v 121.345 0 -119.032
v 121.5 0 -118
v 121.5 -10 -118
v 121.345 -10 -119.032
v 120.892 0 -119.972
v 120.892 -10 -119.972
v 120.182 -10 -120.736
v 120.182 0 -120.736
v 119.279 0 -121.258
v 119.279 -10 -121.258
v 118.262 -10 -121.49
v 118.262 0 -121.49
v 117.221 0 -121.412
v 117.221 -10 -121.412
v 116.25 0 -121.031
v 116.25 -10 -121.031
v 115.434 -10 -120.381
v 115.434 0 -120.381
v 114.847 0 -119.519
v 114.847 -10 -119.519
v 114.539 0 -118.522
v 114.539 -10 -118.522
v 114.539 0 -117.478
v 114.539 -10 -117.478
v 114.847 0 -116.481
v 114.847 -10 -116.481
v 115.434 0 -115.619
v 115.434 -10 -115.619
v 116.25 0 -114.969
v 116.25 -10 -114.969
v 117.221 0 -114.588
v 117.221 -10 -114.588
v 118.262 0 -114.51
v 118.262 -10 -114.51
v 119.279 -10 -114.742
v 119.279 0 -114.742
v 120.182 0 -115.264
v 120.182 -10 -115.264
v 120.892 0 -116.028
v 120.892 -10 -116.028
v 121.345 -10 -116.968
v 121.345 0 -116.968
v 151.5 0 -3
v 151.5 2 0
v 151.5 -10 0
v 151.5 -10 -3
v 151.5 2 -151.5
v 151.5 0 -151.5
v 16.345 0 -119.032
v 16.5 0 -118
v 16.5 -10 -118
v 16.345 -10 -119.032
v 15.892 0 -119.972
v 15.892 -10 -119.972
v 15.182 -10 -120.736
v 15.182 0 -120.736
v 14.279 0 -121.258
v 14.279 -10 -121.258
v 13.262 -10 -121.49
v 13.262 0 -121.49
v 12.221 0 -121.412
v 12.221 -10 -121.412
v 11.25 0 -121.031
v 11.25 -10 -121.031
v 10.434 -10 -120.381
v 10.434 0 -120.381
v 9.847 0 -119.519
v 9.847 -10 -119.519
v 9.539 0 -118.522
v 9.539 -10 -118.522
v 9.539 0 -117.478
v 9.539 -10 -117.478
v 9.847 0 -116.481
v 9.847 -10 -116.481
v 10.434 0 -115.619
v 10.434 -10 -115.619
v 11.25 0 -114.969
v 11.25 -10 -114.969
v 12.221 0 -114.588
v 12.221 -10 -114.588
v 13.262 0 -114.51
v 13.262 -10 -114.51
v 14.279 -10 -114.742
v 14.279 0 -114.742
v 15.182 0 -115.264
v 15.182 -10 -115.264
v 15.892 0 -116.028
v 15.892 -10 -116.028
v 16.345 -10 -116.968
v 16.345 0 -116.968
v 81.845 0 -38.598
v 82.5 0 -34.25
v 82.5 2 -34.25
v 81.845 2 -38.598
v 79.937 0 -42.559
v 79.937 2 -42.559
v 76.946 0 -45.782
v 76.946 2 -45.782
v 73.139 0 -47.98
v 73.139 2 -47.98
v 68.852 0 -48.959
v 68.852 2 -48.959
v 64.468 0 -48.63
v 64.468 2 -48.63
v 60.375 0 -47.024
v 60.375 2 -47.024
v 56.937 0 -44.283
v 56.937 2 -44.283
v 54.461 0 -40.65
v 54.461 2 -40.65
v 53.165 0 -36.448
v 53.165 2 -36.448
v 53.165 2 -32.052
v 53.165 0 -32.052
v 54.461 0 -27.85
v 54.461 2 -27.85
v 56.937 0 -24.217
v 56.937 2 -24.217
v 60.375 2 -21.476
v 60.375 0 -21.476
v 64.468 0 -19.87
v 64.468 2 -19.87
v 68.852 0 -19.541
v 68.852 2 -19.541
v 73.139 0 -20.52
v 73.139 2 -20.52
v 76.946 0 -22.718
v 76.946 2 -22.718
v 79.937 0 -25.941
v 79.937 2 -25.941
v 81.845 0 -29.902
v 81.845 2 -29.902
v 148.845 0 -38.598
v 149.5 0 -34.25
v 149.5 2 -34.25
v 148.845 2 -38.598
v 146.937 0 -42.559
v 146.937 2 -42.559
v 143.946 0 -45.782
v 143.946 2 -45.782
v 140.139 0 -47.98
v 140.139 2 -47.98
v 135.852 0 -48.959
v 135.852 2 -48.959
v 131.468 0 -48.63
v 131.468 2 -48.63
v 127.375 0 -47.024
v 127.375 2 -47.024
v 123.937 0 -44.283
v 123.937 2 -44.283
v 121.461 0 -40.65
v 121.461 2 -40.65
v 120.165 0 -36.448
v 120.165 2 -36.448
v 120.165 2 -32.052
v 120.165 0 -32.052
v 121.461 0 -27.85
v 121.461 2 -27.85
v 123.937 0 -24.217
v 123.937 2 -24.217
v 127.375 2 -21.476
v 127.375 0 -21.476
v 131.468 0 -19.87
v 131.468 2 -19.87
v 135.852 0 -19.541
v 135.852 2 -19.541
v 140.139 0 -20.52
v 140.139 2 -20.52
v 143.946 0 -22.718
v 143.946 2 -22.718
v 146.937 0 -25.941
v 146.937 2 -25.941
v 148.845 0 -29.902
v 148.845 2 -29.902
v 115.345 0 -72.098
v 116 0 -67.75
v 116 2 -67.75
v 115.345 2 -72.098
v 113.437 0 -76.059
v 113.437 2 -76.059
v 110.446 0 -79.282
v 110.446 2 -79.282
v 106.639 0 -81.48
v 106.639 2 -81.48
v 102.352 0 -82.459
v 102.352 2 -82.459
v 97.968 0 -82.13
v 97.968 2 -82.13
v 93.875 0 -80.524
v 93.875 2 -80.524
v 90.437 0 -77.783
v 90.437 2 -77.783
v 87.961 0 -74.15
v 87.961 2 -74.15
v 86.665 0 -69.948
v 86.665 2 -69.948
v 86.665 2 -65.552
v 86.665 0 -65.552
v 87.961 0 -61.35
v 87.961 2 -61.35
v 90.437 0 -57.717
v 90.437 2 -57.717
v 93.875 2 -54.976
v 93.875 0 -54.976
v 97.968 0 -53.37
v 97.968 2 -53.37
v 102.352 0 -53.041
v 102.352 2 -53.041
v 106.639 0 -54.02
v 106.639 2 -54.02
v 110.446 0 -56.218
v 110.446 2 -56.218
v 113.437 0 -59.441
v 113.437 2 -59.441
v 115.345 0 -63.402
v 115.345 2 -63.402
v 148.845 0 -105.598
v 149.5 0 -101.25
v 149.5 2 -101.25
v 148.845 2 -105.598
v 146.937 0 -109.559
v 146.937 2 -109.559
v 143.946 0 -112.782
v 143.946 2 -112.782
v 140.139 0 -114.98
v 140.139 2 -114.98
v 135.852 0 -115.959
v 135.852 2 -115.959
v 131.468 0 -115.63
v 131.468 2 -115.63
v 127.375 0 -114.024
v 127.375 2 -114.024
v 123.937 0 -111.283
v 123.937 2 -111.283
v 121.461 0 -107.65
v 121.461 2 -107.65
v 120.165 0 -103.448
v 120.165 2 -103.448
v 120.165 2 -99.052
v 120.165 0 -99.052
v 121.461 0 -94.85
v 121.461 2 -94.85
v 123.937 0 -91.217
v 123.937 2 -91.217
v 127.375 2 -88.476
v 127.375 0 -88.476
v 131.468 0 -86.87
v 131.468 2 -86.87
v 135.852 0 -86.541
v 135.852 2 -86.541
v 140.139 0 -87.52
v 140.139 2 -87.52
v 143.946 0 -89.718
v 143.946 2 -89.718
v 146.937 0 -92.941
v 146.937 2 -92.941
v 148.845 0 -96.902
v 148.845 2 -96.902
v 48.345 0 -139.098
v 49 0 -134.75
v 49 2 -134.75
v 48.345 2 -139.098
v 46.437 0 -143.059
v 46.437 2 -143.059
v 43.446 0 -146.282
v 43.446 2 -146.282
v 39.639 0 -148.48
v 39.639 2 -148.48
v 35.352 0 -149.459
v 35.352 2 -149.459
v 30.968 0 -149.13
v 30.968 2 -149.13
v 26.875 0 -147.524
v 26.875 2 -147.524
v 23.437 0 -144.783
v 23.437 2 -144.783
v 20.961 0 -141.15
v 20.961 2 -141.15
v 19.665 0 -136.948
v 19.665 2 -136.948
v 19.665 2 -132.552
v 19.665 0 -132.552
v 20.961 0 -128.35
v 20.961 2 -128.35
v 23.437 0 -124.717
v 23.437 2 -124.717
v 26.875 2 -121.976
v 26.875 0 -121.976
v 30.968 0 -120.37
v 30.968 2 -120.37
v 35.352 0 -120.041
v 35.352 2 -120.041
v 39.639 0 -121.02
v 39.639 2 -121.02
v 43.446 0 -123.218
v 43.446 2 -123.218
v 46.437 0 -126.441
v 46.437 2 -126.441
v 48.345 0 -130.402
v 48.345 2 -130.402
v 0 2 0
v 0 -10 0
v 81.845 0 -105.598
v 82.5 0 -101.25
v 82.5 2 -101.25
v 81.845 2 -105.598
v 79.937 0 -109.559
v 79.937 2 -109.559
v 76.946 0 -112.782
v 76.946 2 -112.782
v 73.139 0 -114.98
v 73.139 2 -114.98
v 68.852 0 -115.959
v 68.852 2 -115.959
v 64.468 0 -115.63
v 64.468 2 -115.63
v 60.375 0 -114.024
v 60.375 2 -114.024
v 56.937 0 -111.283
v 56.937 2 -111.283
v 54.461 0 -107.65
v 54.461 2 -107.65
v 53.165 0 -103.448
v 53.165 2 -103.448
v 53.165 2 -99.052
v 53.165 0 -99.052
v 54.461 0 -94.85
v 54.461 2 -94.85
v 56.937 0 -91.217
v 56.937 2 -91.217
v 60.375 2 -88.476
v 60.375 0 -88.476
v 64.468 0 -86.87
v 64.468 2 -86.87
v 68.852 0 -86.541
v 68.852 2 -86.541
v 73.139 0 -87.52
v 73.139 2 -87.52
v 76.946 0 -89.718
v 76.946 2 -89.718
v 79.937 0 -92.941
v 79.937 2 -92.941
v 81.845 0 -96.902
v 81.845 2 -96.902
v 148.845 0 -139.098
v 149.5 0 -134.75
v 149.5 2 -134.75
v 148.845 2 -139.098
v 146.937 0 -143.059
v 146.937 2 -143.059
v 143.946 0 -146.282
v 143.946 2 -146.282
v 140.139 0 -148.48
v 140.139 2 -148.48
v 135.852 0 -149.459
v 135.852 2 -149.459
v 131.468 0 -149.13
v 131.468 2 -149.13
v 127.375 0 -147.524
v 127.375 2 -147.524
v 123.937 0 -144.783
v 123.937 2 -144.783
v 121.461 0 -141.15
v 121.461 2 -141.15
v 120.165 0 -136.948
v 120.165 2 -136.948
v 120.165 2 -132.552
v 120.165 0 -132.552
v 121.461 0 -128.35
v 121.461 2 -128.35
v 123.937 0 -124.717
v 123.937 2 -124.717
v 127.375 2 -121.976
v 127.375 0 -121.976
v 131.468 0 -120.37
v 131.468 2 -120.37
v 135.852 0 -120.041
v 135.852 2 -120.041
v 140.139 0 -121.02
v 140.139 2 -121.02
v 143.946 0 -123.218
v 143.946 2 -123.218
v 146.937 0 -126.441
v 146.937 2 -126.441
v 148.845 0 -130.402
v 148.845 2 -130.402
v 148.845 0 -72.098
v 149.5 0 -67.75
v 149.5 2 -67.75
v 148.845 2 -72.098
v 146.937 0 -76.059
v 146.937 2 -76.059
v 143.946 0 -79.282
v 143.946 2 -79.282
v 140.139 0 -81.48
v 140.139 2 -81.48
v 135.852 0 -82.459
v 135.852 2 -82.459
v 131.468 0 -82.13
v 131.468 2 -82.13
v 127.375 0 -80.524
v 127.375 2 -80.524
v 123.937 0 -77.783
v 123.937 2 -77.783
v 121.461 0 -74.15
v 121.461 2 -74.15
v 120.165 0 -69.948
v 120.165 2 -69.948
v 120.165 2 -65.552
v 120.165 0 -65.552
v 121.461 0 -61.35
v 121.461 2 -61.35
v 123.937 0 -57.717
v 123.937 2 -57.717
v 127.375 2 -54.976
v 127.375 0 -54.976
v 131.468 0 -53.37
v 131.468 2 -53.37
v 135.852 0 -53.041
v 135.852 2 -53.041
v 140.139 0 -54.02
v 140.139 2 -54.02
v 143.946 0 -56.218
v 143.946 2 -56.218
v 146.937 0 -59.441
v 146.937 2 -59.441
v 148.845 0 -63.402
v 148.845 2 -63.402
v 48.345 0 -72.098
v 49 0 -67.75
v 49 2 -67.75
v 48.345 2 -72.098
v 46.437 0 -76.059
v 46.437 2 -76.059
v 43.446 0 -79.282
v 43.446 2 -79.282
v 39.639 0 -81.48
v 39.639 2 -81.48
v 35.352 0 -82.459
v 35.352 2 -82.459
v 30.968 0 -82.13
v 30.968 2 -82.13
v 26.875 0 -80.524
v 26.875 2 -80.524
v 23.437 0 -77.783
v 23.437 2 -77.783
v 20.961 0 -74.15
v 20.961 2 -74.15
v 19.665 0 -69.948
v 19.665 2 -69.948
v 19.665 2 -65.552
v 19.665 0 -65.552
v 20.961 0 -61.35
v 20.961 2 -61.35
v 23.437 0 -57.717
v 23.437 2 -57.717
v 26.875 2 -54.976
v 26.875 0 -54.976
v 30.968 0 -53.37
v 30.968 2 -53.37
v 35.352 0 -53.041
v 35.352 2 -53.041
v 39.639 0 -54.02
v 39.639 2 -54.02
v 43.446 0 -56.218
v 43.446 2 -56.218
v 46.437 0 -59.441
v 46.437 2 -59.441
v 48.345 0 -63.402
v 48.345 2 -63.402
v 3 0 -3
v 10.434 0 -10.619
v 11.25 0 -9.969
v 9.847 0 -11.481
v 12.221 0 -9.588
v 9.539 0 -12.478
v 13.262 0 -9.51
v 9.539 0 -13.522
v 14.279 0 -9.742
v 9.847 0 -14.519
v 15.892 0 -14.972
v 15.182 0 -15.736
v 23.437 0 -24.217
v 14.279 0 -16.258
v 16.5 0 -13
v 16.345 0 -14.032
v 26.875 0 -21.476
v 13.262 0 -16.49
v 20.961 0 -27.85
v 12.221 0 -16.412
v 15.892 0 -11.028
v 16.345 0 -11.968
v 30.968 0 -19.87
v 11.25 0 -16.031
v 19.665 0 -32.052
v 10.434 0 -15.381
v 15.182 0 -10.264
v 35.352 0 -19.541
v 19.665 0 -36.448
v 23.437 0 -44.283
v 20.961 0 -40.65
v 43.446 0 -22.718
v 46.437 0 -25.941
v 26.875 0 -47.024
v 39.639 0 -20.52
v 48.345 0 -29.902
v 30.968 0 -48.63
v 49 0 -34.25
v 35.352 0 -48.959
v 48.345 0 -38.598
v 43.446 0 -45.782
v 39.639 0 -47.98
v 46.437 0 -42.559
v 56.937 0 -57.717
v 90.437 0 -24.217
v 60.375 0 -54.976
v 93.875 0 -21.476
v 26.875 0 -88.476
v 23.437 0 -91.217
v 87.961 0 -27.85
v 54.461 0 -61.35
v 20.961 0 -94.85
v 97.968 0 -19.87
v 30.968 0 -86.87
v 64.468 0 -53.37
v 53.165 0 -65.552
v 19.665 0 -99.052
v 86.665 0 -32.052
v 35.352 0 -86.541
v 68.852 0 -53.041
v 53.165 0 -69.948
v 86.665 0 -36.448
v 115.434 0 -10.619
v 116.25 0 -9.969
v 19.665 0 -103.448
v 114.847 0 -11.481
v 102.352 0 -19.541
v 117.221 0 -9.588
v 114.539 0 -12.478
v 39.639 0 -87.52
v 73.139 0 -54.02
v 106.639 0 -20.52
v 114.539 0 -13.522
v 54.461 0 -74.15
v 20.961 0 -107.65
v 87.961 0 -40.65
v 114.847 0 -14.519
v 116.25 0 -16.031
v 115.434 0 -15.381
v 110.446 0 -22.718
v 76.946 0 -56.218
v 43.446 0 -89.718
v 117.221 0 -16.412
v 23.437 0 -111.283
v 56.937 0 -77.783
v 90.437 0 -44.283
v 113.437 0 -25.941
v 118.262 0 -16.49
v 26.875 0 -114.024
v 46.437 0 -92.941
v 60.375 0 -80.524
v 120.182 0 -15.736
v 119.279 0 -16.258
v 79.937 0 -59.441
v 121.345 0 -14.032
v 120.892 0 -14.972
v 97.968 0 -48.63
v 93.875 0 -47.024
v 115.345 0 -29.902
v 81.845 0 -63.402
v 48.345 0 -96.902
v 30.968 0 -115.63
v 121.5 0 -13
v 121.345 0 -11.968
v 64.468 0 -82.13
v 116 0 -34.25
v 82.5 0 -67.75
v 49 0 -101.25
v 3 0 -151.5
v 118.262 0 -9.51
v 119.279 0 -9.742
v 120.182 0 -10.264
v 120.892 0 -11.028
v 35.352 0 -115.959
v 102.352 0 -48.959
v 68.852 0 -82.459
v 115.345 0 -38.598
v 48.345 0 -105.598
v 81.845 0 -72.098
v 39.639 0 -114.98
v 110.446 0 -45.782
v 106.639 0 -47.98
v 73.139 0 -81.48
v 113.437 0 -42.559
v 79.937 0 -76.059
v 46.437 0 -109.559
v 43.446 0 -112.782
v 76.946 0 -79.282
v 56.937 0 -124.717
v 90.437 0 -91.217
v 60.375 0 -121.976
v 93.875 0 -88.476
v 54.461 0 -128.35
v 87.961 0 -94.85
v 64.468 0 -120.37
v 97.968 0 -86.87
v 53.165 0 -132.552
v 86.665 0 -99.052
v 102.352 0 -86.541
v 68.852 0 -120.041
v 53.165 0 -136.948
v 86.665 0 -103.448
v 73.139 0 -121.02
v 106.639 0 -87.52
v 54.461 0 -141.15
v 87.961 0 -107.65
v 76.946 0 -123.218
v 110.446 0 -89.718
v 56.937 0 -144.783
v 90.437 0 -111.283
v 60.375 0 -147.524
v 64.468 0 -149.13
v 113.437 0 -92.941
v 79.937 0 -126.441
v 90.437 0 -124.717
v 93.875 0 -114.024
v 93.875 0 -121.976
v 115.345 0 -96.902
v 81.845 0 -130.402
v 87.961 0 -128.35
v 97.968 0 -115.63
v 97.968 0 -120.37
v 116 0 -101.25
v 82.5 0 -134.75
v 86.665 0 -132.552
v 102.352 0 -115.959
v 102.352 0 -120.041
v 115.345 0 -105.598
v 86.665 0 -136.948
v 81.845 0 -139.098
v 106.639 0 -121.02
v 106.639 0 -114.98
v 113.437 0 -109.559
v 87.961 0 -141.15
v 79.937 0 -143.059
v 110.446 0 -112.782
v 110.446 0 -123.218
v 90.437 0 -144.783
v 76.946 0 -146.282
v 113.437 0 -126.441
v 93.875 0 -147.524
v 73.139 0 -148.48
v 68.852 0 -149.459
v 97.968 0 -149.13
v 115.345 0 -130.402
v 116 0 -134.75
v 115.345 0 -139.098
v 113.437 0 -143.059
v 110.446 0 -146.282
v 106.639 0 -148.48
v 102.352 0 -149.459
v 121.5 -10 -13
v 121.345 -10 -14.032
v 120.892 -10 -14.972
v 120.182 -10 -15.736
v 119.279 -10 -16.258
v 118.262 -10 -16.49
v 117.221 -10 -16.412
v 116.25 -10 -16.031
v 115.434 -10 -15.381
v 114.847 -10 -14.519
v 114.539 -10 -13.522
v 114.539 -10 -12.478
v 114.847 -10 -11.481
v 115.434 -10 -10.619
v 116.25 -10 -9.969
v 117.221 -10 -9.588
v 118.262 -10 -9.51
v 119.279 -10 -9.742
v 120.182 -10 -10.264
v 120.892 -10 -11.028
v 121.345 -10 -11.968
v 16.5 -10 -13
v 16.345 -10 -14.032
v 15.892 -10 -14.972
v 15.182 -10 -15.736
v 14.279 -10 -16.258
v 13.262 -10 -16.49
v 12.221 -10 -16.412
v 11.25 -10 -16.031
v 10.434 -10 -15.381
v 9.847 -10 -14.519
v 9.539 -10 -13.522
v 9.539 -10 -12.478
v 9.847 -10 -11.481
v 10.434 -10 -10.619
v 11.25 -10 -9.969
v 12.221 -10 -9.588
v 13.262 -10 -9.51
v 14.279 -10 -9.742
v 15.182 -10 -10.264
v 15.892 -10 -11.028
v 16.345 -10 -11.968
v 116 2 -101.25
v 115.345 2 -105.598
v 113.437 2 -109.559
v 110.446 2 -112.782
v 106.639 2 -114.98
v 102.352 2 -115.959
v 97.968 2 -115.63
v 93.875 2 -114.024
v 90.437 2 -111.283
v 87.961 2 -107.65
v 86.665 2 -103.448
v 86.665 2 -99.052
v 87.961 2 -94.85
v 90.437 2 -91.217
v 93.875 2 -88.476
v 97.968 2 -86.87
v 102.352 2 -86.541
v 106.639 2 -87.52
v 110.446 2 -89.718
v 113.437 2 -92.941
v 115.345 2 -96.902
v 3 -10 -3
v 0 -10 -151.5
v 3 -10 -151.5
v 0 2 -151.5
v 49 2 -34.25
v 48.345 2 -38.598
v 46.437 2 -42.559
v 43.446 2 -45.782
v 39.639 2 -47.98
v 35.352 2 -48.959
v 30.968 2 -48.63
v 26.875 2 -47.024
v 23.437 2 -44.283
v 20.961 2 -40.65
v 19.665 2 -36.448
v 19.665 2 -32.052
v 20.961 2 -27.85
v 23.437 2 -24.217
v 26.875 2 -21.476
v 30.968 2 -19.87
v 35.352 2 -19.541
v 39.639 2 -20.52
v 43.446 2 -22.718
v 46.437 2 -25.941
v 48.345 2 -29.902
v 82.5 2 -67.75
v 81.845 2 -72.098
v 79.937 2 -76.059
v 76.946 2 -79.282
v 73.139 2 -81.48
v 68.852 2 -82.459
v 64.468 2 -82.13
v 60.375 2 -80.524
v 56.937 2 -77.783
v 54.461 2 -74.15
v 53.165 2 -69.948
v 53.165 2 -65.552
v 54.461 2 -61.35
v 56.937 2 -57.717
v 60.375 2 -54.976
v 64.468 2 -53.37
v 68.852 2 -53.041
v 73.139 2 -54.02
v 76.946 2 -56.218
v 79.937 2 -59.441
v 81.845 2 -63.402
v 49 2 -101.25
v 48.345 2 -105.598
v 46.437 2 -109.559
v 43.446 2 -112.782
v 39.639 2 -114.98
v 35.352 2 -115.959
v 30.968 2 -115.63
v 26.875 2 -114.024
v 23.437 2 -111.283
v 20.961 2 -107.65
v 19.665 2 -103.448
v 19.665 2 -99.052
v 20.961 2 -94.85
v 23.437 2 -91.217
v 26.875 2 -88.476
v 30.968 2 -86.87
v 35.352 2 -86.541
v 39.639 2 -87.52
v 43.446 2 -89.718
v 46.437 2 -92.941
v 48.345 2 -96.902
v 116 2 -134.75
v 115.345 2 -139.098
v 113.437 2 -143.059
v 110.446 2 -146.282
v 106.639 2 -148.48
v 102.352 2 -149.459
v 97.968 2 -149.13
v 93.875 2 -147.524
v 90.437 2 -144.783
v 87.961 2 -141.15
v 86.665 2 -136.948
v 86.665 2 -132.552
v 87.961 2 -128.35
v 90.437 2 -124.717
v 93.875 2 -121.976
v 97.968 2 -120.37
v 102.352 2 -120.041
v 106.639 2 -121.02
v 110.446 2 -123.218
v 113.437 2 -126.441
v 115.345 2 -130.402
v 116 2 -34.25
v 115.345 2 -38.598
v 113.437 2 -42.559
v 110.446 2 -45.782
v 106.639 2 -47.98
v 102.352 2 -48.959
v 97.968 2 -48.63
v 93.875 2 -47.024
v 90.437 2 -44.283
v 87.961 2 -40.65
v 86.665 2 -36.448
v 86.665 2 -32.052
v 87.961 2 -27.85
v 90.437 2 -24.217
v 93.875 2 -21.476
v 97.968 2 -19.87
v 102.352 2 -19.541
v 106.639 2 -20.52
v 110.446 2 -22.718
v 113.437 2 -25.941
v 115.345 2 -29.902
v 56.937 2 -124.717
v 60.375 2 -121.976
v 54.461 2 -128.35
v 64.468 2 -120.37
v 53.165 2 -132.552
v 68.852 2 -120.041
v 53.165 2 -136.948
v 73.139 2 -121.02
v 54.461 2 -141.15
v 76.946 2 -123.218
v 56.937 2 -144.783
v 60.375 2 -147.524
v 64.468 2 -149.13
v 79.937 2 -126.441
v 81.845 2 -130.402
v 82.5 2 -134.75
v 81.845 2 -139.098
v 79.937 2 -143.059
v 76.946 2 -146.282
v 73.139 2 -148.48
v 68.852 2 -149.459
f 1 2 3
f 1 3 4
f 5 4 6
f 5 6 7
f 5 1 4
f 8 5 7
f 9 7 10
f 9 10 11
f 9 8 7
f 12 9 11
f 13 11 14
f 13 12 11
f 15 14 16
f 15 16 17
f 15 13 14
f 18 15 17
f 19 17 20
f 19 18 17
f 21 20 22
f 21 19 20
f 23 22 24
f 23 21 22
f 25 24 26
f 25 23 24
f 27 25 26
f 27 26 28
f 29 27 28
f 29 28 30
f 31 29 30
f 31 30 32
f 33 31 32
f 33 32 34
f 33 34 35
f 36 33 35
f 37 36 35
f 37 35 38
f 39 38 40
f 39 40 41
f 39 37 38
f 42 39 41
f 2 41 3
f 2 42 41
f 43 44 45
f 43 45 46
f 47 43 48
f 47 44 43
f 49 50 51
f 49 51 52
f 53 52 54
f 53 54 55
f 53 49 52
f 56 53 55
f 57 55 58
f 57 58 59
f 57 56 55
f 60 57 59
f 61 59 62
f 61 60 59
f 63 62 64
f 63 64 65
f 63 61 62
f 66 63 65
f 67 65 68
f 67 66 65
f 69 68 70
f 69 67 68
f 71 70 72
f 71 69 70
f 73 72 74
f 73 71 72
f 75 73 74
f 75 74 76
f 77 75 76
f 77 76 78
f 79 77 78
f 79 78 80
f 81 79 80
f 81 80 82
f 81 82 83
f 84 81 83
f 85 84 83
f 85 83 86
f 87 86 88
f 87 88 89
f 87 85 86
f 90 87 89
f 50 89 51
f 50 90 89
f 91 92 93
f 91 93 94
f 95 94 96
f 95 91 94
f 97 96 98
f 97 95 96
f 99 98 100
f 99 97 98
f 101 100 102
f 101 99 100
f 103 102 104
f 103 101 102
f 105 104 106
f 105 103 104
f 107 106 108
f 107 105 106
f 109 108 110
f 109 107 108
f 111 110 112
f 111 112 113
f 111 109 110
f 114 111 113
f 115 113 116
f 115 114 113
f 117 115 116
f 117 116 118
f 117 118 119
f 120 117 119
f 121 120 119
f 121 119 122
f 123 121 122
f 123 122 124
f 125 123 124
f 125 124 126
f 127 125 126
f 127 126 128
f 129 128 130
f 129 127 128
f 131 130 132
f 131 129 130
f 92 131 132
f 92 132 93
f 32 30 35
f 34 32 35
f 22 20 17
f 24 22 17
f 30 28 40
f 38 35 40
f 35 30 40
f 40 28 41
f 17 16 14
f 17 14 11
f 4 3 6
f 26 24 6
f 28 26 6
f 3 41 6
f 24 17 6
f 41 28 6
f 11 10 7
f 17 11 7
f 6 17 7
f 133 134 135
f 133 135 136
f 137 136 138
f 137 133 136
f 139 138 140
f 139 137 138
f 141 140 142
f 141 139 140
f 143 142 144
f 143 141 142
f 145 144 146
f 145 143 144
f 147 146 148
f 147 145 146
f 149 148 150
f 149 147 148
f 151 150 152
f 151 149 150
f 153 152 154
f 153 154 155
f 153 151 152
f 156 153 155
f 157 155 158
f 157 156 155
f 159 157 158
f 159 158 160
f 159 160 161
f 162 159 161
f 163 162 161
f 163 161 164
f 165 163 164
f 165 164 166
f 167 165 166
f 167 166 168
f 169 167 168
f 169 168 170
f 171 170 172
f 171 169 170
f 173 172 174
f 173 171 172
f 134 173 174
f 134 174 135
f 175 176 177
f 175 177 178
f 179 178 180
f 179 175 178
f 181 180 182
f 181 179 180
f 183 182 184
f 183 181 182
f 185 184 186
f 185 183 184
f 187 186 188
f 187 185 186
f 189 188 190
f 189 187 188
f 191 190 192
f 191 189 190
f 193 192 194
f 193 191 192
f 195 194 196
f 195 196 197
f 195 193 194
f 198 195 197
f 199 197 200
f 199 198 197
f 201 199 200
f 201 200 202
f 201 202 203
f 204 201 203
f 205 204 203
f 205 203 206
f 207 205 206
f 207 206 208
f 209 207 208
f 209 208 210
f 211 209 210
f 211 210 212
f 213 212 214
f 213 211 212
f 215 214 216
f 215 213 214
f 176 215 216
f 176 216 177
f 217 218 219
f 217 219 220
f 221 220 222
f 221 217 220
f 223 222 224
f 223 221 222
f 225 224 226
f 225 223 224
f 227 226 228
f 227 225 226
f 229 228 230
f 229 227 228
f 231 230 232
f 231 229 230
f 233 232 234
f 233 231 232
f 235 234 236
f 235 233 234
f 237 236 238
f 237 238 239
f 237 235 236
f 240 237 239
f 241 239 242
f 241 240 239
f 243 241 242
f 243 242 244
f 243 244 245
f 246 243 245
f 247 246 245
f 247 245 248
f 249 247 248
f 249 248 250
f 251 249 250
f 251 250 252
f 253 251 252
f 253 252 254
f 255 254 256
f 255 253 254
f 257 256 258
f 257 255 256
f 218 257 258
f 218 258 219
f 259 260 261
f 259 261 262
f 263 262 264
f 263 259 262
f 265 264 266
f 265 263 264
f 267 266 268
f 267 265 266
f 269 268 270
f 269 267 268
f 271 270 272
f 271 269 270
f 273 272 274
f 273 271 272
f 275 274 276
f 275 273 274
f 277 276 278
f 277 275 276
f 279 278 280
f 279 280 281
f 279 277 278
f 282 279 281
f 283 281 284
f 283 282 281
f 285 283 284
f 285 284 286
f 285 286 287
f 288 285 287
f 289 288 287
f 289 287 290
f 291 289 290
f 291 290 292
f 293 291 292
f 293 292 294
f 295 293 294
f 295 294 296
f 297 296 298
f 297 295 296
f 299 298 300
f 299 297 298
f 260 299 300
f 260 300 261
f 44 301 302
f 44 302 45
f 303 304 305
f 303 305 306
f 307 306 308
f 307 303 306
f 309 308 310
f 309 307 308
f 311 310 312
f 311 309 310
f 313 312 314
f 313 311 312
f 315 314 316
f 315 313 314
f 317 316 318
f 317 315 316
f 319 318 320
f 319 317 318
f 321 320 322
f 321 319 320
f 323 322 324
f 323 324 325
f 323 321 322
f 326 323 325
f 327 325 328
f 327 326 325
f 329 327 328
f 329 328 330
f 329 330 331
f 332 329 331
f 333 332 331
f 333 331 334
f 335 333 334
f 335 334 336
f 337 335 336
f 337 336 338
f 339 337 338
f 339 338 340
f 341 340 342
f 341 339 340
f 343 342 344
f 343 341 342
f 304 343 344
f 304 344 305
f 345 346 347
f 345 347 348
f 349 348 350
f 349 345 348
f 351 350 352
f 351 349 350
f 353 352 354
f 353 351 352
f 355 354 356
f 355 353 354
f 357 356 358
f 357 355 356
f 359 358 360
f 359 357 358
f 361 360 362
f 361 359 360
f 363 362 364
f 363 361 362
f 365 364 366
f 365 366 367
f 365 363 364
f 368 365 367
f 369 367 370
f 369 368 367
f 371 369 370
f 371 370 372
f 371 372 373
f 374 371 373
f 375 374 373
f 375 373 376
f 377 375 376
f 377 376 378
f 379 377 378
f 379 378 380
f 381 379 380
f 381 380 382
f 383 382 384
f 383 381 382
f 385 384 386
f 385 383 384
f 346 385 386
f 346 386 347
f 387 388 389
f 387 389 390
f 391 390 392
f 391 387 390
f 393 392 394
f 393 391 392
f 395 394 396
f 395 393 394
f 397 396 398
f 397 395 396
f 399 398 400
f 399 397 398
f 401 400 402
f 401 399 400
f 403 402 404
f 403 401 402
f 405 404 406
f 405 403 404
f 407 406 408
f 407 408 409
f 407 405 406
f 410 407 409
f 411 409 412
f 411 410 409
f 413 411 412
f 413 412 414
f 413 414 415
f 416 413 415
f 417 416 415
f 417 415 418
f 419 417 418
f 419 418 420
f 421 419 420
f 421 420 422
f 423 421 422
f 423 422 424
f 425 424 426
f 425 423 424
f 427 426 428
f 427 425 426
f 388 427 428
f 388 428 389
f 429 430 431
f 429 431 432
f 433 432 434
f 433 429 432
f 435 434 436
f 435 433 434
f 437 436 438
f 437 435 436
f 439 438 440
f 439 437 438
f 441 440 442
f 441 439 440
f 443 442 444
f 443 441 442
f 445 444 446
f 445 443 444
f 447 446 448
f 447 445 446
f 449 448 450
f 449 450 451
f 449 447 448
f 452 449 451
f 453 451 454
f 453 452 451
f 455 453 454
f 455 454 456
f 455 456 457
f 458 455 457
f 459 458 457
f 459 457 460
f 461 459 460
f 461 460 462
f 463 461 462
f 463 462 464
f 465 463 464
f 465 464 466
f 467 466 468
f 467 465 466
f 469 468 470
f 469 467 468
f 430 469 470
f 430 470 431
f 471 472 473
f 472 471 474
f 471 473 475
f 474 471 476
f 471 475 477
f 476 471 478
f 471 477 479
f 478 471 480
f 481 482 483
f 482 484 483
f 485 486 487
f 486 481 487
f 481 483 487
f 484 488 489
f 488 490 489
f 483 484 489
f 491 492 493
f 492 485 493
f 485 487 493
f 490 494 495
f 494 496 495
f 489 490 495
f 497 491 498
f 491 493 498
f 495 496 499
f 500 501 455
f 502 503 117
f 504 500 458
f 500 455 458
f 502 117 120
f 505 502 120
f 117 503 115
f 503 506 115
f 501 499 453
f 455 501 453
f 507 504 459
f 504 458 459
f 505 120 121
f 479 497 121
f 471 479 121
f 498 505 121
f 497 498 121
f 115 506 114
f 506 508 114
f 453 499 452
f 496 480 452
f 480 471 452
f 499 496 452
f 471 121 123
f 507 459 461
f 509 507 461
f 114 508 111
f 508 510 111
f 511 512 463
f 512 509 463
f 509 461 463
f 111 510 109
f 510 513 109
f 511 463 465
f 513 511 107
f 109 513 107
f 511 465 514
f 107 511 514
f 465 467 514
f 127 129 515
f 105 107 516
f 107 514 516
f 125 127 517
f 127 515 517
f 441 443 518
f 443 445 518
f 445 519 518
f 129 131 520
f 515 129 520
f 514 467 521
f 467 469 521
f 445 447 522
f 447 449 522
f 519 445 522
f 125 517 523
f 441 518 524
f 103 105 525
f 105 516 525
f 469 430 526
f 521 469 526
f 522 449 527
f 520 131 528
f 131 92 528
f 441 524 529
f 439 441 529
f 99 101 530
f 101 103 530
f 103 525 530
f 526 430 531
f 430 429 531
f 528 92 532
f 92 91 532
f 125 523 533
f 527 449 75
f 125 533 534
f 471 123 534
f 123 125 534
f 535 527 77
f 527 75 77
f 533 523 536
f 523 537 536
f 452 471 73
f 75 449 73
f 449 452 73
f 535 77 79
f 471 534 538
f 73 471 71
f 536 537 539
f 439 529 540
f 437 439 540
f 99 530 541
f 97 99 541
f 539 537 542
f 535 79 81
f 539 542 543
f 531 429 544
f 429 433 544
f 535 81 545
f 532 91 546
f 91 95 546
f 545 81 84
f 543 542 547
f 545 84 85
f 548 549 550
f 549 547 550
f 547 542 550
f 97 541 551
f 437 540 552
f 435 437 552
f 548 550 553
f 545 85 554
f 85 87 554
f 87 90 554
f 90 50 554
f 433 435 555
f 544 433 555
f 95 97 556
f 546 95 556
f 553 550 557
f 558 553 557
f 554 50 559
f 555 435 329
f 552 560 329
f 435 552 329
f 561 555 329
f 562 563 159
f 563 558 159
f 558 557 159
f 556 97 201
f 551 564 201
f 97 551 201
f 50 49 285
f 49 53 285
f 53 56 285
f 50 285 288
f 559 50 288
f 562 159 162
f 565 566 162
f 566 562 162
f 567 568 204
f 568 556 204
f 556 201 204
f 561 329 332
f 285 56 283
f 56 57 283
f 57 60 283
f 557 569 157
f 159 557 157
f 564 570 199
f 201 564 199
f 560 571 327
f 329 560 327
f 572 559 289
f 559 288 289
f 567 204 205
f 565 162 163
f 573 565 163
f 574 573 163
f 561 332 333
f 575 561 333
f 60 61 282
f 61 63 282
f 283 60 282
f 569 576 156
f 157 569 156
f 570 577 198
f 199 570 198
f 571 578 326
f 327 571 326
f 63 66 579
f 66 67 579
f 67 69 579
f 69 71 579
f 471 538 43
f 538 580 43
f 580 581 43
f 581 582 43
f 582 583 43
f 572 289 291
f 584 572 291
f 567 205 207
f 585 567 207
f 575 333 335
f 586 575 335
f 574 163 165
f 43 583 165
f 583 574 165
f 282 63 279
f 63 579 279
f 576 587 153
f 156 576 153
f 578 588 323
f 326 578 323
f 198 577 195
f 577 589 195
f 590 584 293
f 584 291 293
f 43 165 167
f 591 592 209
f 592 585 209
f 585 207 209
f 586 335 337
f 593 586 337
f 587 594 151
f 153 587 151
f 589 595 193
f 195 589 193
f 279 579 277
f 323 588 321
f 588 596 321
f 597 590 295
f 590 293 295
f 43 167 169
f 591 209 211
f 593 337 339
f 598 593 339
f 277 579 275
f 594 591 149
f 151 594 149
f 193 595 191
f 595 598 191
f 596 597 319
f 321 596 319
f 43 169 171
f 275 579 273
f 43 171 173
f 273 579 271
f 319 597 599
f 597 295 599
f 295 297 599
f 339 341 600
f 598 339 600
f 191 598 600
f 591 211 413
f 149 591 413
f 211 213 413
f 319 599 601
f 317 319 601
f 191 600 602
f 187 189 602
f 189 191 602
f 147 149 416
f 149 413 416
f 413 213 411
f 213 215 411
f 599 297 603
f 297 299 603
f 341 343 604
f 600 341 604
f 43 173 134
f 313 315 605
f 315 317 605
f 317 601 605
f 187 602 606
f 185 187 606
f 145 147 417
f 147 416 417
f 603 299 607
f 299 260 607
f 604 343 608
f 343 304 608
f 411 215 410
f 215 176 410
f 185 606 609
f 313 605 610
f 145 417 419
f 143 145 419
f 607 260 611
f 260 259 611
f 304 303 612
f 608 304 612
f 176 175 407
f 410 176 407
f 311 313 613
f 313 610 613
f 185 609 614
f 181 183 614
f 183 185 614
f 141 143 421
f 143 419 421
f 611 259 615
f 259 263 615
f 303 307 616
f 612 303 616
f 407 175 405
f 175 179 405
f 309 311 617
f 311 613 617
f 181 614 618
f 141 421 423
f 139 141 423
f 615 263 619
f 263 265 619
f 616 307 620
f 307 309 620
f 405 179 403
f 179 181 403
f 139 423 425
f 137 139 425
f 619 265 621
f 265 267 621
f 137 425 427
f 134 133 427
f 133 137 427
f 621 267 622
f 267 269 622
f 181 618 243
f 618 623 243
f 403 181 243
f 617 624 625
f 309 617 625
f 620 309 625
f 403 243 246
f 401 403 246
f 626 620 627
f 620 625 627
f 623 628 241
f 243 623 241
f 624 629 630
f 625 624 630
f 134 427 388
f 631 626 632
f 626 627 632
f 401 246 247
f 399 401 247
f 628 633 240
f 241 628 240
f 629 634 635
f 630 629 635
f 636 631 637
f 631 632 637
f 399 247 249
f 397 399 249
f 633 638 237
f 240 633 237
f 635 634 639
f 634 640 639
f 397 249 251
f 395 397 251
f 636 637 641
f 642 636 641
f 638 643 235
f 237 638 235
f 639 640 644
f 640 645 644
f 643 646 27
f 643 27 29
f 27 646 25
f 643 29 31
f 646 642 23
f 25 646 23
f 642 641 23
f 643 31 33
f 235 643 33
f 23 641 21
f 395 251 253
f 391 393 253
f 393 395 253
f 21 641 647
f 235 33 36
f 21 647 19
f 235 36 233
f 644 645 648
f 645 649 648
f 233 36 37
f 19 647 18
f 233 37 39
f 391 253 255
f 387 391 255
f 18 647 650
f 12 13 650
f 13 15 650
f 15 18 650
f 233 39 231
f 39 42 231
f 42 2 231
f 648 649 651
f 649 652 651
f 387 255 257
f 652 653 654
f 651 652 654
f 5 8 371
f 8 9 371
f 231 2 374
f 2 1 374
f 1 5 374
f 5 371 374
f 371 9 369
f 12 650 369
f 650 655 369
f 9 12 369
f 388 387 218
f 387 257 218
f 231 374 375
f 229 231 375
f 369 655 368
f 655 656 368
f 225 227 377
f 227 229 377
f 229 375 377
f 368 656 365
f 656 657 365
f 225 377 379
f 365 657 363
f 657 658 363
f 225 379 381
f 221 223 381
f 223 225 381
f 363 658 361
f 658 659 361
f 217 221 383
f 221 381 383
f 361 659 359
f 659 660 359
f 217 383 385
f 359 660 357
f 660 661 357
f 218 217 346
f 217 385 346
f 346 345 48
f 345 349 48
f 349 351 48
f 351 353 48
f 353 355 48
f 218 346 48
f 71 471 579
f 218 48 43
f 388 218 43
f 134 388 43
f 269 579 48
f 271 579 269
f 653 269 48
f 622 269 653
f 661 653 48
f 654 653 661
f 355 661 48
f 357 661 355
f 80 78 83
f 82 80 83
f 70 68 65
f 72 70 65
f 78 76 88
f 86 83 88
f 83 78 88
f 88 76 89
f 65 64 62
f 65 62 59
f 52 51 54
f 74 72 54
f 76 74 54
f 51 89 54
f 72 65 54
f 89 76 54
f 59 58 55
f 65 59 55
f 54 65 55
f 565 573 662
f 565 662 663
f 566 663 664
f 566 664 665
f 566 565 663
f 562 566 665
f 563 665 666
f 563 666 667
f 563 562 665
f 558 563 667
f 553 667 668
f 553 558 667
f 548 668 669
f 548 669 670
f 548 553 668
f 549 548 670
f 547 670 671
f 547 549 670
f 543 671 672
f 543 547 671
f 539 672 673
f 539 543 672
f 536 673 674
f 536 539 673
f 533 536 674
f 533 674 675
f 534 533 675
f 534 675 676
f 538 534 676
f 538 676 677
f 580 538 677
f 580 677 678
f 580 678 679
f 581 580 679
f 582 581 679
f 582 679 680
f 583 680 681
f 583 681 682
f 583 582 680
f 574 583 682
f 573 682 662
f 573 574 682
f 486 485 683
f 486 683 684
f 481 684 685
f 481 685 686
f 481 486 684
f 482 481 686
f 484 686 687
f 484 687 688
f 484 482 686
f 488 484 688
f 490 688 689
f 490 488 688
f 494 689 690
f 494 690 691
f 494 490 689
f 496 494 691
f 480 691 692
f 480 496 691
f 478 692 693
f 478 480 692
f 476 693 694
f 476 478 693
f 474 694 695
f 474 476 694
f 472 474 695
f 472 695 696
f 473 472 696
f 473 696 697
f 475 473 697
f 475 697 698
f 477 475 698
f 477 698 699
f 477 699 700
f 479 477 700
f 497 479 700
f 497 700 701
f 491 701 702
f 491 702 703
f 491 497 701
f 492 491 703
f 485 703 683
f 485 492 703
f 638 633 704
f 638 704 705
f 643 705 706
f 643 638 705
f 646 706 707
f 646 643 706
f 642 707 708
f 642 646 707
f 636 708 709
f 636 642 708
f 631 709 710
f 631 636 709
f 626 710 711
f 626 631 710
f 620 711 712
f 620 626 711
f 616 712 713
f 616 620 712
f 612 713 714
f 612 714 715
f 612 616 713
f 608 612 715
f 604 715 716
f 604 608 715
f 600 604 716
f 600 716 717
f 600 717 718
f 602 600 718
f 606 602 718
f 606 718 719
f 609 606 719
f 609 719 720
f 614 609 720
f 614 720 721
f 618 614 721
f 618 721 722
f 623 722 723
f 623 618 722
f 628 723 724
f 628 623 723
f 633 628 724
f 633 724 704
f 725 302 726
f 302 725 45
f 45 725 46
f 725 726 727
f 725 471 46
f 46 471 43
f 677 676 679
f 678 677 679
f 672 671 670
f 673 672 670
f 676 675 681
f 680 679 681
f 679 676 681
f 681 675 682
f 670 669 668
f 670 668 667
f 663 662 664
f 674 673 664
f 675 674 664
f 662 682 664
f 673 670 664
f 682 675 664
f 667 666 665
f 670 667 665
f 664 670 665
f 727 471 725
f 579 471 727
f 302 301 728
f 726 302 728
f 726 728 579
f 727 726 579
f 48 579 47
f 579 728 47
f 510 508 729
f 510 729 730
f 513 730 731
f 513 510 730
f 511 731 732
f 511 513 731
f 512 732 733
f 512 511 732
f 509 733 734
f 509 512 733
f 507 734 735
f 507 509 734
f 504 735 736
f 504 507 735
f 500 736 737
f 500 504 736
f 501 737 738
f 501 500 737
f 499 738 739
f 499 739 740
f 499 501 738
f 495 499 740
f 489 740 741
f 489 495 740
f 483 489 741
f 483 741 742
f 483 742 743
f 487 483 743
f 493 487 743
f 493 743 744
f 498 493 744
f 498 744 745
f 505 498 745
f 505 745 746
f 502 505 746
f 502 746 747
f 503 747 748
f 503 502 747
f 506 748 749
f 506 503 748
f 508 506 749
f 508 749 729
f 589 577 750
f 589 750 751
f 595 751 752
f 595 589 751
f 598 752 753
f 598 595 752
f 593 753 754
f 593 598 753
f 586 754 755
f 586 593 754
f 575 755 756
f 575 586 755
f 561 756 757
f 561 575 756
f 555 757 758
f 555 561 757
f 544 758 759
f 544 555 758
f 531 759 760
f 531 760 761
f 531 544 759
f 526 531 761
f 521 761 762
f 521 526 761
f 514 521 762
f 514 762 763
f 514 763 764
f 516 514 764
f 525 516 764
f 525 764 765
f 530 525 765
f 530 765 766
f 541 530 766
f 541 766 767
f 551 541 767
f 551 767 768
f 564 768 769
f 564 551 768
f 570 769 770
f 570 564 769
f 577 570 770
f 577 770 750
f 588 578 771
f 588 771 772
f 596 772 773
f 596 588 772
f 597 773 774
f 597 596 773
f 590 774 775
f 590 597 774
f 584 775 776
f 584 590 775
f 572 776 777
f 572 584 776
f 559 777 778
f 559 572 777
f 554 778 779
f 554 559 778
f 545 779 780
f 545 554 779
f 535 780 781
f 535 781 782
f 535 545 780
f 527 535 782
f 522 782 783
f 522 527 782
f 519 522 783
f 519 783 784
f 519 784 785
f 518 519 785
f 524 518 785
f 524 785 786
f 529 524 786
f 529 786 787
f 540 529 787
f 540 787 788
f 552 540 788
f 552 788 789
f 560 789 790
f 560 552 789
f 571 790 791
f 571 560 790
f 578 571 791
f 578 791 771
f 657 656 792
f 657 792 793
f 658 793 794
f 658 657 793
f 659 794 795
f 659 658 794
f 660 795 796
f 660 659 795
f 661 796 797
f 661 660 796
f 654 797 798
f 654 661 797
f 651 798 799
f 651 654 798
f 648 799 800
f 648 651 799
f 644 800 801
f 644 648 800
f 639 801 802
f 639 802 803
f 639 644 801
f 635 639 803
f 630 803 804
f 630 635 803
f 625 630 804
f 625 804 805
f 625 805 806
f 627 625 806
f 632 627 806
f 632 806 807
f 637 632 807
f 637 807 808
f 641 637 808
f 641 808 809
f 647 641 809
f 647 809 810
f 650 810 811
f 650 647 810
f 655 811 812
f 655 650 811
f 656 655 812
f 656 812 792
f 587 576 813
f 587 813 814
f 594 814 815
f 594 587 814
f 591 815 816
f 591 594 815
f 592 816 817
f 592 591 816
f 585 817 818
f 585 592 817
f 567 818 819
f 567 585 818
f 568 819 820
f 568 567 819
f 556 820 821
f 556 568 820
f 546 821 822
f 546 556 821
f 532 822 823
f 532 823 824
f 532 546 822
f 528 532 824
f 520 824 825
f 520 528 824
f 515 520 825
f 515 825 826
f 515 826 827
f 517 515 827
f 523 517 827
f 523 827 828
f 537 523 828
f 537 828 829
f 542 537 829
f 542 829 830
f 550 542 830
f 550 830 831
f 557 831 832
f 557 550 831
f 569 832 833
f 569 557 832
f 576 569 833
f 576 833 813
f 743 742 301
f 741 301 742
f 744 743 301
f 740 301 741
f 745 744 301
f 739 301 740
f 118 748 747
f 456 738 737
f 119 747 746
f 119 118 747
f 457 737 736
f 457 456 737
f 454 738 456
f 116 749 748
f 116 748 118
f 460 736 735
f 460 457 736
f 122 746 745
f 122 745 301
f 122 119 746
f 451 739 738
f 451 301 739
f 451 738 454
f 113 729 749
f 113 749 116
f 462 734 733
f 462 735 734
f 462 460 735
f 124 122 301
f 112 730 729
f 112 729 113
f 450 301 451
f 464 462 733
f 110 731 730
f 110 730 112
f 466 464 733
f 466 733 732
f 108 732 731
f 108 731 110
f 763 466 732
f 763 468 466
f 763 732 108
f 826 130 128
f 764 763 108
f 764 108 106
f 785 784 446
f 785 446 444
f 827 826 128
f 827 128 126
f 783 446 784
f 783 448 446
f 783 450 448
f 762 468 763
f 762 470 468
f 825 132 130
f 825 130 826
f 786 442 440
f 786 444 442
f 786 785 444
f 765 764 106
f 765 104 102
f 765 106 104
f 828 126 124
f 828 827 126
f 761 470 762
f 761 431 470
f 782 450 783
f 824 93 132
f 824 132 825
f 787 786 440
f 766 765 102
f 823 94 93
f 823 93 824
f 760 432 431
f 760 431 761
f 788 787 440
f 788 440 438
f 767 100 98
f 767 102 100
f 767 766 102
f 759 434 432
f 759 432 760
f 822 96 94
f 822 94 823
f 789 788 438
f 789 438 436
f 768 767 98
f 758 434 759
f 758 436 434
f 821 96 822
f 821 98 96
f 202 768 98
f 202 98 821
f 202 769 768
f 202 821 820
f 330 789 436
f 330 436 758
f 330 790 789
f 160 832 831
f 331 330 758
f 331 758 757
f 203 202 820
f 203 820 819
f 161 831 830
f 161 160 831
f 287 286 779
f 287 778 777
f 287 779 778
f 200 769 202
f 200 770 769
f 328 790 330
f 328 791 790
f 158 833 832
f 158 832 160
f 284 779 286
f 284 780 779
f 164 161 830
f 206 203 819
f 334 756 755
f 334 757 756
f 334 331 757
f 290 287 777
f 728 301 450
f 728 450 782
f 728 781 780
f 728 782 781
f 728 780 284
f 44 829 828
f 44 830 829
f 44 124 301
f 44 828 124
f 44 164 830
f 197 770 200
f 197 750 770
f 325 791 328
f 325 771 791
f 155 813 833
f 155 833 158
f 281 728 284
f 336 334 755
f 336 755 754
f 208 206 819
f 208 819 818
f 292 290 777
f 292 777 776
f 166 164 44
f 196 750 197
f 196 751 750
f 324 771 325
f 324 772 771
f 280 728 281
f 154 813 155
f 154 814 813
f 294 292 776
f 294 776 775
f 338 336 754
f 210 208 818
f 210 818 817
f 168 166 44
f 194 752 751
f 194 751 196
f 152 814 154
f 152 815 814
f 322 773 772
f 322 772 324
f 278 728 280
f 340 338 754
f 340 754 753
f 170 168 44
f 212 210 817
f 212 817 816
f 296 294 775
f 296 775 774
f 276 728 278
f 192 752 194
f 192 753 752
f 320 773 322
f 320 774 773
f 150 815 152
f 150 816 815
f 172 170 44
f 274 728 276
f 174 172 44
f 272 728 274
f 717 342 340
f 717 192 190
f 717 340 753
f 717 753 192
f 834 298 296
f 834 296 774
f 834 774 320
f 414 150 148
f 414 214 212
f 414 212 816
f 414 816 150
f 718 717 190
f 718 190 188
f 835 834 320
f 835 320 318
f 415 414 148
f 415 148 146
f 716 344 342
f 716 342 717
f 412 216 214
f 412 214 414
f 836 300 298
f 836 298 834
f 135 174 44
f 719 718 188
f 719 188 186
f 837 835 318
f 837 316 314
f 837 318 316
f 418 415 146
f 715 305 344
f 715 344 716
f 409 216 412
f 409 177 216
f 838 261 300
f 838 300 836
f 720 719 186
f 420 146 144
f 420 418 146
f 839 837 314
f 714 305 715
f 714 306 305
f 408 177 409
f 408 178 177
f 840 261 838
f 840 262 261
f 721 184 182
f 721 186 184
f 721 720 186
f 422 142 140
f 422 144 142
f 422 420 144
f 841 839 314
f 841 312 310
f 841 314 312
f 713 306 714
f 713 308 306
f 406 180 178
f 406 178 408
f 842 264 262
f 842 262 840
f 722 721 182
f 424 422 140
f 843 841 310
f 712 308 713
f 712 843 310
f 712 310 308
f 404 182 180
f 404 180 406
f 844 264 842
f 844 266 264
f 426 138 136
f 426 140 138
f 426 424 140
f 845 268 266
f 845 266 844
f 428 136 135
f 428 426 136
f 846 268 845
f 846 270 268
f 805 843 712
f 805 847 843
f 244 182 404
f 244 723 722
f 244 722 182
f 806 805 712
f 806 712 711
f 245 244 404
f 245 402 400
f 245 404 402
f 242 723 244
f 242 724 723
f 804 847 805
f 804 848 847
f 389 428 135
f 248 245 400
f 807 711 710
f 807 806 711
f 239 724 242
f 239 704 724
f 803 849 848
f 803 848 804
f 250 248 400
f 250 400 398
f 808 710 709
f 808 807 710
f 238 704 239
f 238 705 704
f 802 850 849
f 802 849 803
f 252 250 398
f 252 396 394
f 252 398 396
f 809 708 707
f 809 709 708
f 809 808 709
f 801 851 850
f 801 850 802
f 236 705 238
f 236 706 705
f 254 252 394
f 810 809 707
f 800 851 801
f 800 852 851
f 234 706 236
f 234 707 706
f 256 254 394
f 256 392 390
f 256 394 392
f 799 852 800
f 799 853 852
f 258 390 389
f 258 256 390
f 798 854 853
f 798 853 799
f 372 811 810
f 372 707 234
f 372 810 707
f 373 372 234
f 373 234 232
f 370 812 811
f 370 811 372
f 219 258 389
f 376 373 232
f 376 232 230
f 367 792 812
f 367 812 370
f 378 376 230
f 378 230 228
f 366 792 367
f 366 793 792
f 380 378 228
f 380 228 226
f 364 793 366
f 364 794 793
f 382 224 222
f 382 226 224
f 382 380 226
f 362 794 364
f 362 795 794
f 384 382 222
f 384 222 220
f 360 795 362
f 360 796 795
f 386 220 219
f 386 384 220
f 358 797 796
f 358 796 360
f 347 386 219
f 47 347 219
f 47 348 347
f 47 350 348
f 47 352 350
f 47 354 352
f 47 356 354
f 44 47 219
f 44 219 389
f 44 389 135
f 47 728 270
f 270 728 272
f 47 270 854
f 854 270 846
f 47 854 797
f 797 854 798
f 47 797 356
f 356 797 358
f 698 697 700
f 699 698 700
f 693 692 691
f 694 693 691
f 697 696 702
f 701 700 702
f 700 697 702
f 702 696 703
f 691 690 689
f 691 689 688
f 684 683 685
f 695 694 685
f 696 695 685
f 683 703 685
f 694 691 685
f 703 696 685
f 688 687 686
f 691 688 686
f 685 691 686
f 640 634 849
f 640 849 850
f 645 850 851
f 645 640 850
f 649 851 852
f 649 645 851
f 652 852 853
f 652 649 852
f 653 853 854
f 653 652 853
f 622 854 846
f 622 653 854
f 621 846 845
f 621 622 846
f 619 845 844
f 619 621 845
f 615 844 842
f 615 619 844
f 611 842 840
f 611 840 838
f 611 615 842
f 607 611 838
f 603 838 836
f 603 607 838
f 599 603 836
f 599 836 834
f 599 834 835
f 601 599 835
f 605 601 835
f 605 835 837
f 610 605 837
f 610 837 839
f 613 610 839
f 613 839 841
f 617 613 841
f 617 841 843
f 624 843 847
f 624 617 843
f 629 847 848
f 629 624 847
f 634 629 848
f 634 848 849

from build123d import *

# Parameters (mm, degrees)
SKETCH1_W            = 151.5
SKETCH1_H            = 151.5
BOSS_EXTRUDE1_DEPTH  = 2
SKETCH2_R            = 14.75
CUT_EXTRUDE2_DEPTH   = 2
LPATTERN1_COUNT      = 4
LPATTERN1_PITCH      = 33.5
LPATTERN1_COUNT_DIR2 = 4
LPATTERN1_PITCH_DIR2 = 33.5
SKETCH3_W            = 151.5
SKETCH3_H            = 151.5
BOSS_EXTRUDE2_DEPTH  = 10
SKETCH5_W            = 148.5
SKETCH5_H            = 148.5
CUT_EXTRUDE4_DEPTH   = 10
SKETCH8_R            = 3.5
BOSS_EXTRUDE4_DEPTH  = 10
LPATTERN2_COUNT      = 2
LPATTERN2_PITCH      = 105
LPATTERN2_COUNT_DIR2 = 2
LPATTERN2_PITCH_DIR2 = 105


with BuildPart() as part:
    # Sketch1 → Boss-Extrude1 (new body)
    with BuildSketch(Plane(origin=(0, 0, 0), x_dir=(1, 0, 0), z_dir=(0, 1, 0))):
        with Locations((75.75, 75.75)):
            Rectangle(SKETCH1_W, SKETCH1_H)
    extrude(amount=BOSS_EXTRUDE1_DEPTH)

    # Sketch2 → Cut-Extrude2 (cut)
    with BuildSketch(Plane(origin=(0, 0, 0), x_dir=(1, 0, 0), z_dir=(0, 1, 0))):
        with Locations((34.25, 34.25)):
            Circle(SKETCH2_R)
    cut_extrude2 = extrude(amount=CUT_EXTRUDE2_DEPTH, mode=Mode.SUBTRACT)

    # LPattern1: Cut-Extrude2 4 × 4
    with Locations(*[(i * LPATTERN1_PITCH, 0, -j * LPATTERN1_PITCH_DIR2) for i in range(LPATTERN1_COUNT) for j in range(LPATTERN1_COUNT_DIR2) if (i, j) != (0, 0)]):
        add(cut_extrude2, mode=Mode.SUBTRACT)

    # Sketch3 → Boss-Extrude2 (add)
    with BuildSketch(Plane(origin=(0, 0, 0), x_dir=(1, 0, 0), z_dir=(0, 1, 0))):
        with Locations((75.75, 75.75)):
            Rectangle(SKETCH3_W, SKETCH3_H)
    extrude(amount=-BOSS_EXTRUDE2_DEPTH)

    # Sketch5 → Cut-Extrude4 (cut)
    with BuildSketch(Plane(origin=(0, 0, 0), x_dir=(1, 0, 0), z_dir=(0, 1, 0))):
        with Locations((77.25, 77.25)):
            Rectangle(SKETCH5_W, SKETCH5_H)
    extrude(amount=-CUT_EXTRUDE4_DEPTH, mode=Mode.SUBTRACT)

    # Sketch8 → Boss-Extrude4 (add)
    with BuildSketch(Plane(origin=(0, 0, 0), x_dir=(1, 0, 0), z_dir=(0, 1, 0))):
        with Locations((13, 13)):
            Circle(SKETCH8_R)
    boss_extrude4 = extrude(amount=-BOSS_EXTRUDE4_DEPTH)

    # LPattern2: Boss-Extrude4 2 × 2
    with Locations(*[(j * LPATTERN2_PITCH_DIR2, 0, -i * LPATTERN2_PITCH) for i in range(LPATTERN2_COUNT) for j in range(LPATTERN2_COUNT_DIR2) if (i, j) != (0, 0)]):
        add(boss_extrude4)


solid = part.part
